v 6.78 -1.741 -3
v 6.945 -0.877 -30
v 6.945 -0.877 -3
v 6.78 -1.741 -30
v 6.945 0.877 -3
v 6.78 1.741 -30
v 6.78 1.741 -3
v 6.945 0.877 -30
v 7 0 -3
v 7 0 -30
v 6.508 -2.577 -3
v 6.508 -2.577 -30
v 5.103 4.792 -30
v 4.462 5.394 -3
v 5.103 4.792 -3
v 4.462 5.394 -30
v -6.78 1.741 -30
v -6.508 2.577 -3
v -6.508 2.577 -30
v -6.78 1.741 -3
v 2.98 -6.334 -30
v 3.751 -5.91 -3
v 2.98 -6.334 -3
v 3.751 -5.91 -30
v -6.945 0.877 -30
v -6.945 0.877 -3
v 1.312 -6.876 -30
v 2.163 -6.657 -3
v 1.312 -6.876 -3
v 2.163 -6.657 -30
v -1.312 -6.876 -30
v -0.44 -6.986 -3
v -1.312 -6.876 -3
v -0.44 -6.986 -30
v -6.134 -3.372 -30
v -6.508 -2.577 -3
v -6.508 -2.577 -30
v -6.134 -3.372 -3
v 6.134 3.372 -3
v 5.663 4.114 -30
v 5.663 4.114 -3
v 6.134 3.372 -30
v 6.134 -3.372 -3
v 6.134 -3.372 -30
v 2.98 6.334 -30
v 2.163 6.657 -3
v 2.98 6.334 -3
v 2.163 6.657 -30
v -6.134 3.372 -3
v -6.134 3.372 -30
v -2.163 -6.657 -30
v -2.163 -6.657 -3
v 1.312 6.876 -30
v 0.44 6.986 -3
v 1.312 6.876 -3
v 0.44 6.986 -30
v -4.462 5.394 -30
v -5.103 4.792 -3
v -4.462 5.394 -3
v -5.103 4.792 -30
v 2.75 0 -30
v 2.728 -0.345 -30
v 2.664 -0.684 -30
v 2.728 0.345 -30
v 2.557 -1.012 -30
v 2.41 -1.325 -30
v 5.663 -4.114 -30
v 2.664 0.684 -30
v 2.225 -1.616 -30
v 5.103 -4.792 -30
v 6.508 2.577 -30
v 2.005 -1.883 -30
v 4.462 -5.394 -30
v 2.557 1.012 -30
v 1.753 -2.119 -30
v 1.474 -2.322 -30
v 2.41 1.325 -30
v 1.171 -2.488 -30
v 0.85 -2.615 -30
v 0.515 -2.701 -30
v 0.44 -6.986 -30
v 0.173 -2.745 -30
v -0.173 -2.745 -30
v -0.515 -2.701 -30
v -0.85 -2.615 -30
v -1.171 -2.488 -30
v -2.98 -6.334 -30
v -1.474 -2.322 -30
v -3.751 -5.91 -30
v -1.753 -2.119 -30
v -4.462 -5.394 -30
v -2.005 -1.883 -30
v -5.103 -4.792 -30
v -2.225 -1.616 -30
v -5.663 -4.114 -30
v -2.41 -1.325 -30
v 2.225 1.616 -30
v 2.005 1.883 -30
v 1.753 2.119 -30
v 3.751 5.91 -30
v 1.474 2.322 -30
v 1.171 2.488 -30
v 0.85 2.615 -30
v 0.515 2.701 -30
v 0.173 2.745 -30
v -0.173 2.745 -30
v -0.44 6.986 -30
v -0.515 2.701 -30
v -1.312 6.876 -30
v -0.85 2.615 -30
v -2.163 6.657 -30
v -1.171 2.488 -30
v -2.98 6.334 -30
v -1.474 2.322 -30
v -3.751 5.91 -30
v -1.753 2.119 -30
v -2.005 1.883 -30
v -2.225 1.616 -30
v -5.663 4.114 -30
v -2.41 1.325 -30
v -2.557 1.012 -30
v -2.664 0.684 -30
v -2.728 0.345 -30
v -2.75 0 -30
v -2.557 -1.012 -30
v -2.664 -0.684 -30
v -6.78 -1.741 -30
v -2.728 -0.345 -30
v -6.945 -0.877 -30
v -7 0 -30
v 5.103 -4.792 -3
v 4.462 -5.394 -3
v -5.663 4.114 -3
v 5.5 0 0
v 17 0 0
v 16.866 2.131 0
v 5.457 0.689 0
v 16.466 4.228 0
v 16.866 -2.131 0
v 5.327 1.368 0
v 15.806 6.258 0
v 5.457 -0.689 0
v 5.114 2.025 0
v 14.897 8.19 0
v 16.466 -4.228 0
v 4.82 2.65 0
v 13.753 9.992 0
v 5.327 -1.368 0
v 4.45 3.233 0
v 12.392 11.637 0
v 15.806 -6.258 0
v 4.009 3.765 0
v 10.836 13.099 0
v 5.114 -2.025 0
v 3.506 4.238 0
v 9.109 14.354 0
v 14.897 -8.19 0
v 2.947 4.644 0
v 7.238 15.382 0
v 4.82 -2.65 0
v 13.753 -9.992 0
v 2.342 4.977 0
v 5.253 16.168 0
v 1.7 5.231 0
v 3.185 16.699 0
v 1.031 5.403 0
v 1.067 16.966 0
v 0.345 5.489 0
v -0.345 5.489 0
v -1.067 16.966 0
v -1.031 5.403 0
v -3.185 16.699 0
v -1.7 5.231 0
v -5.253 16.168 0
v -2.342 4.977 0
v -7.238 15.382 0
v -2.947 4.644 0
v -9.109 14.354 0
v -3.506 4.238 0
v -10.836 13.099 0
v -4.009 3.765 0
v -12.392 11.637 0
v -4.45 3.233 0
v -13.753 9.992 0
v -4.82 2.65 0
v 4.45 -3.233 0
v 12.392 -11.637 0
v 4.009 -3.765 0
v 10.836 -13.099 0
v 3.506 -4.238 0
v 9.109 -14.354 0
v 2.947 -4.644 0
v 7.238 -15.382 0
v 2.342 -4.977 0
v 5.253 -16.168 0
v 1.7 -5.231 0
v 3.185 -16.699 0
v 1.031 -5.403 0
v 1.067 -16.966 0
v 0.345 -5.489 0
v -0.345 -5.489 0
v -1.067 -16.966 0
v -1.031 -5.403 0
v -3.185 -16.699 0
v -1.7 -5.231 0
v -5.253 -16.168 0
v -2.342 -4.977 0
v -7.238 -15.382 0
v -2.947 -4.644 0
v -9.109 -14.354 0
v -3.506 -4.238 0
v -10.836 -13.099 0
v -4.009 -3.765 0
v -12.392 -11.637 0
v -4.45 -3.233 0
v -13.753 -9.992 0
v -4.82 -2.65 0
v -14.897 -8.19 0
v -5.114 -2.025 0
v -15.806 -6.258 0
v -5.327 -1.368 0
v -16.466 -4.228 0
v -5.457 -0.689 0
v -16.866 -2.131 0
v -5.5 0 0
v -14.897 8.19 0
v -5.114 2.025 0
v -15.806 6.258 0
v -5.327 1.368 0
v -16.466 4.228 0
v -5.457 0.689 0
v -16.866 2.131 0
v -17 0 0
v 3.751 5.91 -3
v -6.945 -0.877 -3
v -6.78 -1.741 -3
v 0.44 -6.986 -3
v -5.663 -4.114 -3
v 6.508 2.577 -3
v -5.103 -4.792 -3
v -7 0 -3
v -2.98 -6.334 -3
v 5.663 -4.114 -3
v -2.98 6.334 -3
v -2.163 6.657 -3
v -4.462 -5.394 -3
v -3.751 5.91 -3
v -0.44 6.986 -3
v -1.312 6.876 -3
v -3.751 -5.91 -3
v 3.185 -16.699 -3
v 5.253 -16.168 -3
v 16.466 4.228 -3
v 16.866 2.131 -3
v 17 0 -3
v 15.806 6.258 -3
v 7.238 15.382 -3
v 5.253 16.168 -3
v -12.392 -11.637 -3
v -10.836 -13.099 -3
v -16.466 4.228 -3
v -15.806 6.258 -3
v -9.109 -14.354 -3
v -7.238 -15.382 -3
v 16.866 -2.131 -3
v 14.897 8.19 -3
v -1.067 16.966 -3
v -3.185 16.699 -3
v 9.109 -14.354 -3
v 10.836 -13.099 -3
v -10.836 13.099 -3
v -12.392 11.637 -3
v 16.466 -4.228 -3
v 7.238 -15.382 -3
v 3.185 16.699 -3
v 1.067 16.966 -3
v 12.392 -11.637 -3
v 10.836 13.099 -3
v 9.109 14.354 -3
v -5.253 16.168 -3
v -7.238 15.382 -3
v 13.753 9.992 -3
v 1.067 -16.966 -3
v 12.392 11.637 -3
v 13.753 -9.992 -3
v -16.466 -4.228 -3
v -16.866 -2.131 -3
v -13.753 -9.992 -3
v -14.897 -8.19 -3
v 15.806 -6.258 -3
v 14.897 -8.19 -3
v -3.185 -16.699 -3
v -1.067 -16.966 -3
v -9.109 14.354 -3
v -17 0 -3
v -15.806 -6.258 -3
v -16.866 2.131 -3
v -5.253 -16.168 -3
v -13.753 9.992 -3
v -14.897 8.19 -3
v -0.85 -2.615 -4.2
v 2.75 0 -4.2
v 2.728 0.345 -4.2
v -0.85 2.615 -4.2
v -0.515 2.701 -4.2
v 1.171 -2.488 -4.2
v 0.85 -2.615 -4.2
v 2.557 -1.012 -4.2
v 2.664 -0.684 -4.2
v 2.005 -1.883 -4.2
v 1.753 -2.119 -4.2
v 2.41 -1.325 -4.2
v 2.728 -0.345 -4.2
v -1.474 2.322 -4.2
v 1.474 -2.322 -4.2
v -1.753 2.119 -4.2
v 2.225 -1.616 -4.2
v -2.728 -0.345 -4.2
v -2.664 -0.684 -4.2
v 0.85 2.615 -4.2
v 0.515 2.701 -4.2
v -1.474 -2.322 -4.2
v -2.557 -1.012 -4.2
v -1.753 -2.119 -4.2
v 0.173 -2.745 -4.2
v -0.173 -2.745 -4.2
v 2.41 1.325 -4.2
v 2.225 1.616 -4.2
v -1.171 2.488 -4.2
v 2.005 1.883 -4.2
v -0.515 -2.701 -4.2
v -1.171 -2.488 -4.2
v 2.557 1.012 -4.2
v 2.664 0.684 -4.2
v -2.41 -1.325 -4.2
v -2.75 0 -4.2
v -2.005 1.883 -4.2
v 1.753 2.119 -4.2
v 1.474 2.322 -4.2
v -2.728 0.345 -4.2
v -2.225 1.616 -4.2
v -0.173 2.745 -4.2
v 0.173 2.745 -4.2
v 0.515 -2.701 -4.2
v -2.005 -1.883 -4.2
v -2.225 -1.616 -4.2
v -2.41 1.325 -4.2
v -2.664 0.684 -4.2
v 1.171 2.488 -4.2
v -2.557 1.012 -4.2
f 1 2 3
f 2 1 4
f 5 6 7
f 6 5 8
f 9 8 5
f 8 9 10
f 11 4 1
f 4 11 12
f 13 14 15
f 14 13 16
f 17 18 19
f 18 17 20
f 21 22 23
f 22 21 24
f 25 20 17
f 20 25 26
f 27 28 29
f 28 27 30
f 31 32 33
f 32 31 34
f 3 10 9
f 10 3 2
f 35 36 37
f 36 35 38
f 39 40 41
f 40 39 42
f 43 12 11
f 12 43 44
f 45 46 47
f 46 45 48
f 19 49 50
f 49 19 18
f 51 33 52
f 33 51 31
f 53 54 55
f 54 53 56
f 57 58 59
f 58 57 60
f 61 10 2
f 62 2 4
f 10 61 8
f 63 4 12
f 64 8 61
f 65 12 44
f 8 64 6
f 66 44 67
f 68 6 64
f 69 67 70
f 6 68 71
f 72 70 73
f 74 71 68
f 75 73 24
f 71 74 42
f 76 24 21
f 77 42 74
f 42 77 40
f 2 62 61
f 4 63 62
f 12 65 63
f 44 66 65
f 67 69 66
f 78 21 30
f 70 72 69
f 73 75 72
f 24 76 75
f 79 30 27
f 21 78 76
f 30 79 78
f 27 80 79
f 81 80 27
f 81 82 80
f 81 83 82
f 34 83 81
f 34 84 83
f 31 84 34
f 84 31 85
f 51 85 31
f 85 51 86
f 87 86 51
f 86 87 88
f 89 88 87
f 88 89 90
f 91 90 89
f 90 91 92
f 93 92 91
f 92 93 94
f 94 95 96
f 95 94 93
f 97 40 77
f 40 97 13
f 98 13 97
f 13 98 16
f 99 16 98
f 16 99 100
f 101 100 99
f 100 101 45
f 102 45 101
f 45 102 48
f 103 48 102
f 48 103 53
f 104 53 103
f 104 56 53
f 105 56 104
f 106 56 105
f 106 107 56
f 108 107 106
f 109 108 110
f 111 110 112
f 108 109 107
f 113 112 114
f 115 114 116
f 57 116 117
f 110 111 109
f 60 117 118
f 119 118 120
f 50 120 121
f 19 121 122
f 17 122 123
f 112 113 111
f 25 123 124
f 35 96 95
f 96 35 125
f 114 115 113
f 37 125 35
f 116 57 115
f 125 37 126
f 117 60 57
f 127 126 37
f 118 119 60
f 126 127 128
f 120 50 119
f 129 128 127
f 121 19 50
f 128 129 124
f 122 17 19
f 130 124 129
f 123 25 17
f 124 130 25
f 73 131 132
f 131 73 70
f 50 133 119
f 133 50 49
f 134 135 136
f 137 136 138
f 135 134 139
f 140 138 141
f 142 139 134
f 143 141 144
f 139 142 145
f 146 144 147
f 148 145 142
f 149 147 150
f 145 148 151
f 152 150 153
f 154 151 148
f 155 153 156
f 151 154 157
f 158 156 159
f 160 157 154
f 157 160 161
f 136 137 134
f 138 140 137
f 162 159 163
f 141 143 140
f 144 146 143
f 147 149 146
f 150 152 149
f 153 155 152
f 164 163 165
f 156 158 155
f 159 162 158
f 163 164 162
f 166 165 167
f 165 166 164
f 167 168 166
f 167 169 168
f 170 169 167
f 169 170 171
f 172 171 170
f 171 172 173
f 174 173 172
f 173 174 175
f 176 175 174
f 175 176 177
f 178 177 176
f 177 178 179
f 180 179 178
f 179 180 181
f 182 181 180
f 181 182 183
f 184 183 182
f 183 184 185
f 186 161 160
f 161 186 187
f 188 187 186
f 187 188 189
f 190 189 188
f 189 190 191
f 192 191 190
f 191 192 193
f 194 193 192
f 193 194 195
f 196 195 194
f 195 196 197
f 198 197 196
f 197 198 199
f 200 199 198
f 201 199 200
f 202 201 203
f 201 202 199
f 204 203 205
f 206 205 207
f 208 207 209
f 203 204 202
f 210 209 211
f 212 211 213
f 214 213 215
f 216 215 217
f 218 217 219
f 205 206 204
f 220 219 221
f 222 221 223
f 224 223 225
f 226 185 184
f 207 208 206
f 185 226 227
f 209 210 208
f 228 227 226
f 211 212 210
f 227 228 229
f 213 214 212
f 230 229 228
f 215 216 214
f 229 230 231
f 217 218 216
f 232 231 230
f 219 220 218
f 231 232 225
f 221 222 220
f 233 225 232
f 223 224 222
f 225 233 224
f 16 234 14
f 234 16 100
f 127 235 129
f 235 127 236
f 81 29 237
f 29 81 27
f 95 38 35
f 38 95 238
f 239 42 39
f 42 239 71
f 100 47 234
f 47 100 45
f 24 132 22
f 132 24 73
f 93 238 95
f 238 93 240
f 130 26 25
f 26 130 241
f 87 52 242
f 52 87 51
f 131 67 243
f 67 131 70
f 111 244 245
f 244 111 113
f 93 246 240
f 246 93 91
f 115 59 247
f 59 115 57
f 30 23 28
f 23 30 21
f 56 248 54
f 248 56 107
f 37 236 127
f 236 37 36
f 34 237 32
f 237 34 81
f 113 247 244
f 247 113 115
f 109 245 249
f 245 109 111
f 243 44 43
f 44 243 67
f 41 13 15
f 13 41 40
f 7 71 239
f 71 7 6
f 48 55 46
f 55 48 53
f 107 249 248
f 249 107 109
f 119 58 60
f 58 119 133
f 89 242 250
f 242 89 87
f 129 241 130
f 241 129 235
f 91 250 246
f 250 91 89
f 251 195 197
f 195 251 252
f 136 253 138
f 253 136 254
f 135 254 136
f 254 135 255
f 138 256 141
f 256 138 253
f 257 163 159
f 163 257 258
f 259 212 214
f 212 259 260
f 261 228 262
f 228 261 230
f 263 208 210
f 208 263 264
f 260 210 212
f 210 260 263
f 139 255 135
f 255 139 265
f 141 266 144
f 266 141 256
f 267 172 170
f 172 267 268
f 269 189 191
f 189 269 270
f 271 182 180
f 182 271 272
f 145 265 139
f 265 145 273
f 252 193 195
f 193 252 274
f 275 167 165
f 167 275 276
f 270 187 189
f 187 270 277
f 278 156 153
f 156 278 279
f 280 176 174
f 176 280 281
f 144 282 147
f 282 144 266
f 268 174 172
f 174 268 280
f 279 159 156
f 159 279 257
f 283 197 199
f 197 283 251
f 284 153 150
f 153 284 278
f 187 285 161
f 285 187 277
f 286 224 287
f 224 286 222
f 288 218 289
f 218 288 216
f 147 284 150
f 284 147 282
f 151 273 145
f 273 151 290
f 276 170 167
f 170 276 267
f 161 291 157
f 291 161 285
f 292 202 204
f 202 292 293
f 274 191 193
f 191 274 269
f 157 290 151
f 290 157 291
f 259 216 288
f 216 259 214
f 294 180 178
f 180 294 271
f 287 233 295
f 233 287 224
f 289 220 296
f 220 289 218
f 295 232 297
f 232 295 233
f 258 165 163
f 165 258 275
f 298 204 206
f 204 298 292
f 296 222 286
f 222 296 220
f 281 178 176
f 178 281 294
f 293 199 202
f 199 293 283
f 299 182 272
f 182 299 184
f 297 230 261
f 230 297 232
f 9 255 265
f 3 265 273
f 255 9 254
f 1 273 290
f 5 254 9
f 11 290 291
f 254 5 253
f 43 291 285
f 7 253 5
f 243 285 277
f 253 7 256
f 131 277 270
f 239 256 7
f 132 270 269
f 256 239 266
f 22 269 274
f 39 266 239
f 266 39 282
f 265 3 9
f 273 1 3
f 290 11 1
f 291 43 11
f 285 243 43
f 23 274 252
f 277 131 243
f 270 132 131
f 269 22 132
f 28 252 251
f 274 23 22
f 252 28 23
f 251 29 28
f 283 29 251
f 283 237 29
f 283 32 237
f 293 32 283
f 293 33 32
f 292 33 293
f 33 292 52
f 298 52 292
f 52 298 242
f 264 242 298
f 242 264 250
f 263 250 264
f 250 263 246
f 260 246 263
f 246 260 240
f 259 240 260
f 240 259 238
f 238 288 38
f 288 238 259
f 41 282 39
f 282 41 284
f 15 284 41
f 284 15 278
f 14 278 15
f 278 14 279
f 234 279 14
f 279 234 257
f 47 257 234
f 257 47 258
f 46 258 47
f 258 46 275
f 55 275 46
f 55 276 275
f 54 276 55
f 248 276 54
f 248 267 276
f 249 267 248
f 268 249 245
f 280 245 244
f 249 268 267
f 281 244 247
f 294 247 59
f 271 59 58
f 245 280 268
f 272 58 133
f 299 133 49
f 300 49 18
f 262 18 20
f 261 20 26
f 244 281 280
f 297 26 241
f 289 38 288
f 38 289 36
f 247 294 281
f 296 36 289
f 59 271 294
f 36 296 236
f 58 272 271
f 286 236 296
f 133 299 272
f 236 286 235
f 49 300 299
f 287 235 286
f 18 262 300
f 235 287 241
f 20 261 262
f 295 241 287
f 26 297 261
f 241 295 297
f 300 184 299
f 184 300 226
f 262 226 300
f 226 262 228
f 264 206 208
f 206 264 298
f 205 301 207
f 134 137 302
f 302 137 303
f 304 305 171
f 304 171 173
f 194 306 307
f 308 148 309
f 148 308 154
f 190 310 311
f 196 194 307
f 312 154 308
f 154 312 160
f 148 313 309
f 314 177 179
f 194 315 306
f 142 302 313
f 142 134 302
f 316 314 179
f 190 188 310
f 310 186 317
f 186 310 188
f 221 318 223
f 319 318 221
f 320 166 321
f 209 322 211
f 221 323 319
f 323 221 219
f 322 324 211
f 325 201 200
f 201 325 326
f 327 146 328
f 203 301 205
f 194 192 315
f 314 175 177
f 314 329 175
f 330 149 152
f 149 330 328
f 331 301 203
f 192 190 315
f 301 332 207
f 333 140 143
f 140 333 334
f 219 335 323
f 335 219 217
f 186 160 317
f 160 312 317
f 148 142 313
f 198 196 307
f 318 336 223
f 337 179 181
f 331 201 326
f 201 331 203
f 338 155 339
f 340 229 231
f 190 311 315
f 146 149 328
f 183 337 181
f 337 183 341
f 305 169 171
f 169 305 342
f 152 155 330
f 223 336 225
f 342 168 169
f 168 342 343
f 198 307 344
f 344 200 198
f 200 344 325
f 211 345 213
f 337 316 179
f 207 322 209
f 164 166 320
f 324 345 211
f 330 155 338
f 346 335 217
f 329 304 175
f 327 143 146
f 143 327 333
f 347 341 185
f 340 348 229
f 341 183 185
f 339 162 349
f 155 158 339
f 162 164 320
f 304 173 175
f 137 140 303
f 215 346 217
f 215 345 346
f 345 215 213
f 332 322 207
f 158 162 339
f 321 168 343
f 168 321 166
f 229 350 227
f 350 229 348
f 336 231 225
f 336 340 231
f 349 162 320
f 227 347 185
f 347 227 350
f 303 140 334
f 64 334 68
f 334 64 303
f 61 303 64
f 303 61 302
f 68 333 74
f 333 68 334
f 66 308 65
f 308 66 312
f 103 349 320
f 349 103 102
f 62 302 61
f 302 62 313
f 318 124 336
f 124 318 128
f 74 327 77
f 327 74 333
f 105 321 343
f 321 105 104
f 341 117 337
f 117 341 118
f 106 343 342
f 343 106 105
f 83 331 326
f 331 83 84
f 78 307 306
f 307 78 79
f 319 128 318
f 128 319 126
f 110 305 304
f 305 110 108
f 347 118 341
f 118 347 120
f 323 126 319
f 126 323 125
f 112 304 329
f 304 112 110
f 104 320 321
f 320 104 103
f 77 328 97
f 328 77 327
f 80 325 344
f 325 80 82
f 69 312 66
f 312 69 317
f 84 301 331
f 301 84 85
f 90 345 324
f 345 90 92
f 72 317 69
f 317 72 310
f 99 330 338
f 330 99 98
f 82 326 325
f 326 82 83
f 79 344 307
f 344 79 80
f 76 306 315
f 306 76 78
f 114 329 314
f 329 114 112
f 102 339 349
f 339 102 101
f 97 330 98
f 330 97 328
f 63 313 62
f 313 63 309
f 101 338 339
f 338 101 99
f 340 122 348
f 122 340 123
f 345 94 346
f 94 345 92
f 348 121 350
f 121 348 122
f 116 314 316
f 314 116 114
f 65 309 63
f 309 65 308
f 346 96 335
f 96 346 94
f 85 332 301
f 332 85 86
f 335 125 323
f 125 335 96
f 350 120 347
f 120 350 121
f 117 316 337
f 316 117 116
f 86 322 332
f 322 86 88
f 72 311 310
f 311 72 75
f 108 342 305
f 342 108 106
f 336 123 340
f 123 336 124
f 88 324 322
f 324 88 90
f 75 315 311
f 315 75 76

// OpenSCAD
$fn = 50;


difference() {
	union() {
		translate(v = [0, 0, -30.0000000000]) {
			cylinder(h = 30, r = 7.0000000000);
		}
		translate(v = [0, 0, -3.0000000000]) {
			cylinder(h = 3, r = 17.0000000000);
		}
	}
	union() {
		translate(v = [0, 0, 0]) {
			rotate(a = [0, 0, 0]) {
				difference() {
					union() {
						#translate(v = [0, 0, -30.0000000000]) {
							cylinder(h = 30, r = 2.2500000000);
						}
						#translate(v = [0, 0, -4.2000000000]) {
							cylinder(h = 4.2000000000, r1 = 2.7500000000, r2 = 5.5000000000);
						}
						#translate(v = [0, 0, -30.0000000000]) {
							cylinder(h = 30, r = 2.7500000000);
						}
						#translate(v = [0, 0, -30.0000000000]) {
							cylinder(h = 30, r = 2.2500000000);
						}
					}
					union();
				}
			}
		}
	}
}
